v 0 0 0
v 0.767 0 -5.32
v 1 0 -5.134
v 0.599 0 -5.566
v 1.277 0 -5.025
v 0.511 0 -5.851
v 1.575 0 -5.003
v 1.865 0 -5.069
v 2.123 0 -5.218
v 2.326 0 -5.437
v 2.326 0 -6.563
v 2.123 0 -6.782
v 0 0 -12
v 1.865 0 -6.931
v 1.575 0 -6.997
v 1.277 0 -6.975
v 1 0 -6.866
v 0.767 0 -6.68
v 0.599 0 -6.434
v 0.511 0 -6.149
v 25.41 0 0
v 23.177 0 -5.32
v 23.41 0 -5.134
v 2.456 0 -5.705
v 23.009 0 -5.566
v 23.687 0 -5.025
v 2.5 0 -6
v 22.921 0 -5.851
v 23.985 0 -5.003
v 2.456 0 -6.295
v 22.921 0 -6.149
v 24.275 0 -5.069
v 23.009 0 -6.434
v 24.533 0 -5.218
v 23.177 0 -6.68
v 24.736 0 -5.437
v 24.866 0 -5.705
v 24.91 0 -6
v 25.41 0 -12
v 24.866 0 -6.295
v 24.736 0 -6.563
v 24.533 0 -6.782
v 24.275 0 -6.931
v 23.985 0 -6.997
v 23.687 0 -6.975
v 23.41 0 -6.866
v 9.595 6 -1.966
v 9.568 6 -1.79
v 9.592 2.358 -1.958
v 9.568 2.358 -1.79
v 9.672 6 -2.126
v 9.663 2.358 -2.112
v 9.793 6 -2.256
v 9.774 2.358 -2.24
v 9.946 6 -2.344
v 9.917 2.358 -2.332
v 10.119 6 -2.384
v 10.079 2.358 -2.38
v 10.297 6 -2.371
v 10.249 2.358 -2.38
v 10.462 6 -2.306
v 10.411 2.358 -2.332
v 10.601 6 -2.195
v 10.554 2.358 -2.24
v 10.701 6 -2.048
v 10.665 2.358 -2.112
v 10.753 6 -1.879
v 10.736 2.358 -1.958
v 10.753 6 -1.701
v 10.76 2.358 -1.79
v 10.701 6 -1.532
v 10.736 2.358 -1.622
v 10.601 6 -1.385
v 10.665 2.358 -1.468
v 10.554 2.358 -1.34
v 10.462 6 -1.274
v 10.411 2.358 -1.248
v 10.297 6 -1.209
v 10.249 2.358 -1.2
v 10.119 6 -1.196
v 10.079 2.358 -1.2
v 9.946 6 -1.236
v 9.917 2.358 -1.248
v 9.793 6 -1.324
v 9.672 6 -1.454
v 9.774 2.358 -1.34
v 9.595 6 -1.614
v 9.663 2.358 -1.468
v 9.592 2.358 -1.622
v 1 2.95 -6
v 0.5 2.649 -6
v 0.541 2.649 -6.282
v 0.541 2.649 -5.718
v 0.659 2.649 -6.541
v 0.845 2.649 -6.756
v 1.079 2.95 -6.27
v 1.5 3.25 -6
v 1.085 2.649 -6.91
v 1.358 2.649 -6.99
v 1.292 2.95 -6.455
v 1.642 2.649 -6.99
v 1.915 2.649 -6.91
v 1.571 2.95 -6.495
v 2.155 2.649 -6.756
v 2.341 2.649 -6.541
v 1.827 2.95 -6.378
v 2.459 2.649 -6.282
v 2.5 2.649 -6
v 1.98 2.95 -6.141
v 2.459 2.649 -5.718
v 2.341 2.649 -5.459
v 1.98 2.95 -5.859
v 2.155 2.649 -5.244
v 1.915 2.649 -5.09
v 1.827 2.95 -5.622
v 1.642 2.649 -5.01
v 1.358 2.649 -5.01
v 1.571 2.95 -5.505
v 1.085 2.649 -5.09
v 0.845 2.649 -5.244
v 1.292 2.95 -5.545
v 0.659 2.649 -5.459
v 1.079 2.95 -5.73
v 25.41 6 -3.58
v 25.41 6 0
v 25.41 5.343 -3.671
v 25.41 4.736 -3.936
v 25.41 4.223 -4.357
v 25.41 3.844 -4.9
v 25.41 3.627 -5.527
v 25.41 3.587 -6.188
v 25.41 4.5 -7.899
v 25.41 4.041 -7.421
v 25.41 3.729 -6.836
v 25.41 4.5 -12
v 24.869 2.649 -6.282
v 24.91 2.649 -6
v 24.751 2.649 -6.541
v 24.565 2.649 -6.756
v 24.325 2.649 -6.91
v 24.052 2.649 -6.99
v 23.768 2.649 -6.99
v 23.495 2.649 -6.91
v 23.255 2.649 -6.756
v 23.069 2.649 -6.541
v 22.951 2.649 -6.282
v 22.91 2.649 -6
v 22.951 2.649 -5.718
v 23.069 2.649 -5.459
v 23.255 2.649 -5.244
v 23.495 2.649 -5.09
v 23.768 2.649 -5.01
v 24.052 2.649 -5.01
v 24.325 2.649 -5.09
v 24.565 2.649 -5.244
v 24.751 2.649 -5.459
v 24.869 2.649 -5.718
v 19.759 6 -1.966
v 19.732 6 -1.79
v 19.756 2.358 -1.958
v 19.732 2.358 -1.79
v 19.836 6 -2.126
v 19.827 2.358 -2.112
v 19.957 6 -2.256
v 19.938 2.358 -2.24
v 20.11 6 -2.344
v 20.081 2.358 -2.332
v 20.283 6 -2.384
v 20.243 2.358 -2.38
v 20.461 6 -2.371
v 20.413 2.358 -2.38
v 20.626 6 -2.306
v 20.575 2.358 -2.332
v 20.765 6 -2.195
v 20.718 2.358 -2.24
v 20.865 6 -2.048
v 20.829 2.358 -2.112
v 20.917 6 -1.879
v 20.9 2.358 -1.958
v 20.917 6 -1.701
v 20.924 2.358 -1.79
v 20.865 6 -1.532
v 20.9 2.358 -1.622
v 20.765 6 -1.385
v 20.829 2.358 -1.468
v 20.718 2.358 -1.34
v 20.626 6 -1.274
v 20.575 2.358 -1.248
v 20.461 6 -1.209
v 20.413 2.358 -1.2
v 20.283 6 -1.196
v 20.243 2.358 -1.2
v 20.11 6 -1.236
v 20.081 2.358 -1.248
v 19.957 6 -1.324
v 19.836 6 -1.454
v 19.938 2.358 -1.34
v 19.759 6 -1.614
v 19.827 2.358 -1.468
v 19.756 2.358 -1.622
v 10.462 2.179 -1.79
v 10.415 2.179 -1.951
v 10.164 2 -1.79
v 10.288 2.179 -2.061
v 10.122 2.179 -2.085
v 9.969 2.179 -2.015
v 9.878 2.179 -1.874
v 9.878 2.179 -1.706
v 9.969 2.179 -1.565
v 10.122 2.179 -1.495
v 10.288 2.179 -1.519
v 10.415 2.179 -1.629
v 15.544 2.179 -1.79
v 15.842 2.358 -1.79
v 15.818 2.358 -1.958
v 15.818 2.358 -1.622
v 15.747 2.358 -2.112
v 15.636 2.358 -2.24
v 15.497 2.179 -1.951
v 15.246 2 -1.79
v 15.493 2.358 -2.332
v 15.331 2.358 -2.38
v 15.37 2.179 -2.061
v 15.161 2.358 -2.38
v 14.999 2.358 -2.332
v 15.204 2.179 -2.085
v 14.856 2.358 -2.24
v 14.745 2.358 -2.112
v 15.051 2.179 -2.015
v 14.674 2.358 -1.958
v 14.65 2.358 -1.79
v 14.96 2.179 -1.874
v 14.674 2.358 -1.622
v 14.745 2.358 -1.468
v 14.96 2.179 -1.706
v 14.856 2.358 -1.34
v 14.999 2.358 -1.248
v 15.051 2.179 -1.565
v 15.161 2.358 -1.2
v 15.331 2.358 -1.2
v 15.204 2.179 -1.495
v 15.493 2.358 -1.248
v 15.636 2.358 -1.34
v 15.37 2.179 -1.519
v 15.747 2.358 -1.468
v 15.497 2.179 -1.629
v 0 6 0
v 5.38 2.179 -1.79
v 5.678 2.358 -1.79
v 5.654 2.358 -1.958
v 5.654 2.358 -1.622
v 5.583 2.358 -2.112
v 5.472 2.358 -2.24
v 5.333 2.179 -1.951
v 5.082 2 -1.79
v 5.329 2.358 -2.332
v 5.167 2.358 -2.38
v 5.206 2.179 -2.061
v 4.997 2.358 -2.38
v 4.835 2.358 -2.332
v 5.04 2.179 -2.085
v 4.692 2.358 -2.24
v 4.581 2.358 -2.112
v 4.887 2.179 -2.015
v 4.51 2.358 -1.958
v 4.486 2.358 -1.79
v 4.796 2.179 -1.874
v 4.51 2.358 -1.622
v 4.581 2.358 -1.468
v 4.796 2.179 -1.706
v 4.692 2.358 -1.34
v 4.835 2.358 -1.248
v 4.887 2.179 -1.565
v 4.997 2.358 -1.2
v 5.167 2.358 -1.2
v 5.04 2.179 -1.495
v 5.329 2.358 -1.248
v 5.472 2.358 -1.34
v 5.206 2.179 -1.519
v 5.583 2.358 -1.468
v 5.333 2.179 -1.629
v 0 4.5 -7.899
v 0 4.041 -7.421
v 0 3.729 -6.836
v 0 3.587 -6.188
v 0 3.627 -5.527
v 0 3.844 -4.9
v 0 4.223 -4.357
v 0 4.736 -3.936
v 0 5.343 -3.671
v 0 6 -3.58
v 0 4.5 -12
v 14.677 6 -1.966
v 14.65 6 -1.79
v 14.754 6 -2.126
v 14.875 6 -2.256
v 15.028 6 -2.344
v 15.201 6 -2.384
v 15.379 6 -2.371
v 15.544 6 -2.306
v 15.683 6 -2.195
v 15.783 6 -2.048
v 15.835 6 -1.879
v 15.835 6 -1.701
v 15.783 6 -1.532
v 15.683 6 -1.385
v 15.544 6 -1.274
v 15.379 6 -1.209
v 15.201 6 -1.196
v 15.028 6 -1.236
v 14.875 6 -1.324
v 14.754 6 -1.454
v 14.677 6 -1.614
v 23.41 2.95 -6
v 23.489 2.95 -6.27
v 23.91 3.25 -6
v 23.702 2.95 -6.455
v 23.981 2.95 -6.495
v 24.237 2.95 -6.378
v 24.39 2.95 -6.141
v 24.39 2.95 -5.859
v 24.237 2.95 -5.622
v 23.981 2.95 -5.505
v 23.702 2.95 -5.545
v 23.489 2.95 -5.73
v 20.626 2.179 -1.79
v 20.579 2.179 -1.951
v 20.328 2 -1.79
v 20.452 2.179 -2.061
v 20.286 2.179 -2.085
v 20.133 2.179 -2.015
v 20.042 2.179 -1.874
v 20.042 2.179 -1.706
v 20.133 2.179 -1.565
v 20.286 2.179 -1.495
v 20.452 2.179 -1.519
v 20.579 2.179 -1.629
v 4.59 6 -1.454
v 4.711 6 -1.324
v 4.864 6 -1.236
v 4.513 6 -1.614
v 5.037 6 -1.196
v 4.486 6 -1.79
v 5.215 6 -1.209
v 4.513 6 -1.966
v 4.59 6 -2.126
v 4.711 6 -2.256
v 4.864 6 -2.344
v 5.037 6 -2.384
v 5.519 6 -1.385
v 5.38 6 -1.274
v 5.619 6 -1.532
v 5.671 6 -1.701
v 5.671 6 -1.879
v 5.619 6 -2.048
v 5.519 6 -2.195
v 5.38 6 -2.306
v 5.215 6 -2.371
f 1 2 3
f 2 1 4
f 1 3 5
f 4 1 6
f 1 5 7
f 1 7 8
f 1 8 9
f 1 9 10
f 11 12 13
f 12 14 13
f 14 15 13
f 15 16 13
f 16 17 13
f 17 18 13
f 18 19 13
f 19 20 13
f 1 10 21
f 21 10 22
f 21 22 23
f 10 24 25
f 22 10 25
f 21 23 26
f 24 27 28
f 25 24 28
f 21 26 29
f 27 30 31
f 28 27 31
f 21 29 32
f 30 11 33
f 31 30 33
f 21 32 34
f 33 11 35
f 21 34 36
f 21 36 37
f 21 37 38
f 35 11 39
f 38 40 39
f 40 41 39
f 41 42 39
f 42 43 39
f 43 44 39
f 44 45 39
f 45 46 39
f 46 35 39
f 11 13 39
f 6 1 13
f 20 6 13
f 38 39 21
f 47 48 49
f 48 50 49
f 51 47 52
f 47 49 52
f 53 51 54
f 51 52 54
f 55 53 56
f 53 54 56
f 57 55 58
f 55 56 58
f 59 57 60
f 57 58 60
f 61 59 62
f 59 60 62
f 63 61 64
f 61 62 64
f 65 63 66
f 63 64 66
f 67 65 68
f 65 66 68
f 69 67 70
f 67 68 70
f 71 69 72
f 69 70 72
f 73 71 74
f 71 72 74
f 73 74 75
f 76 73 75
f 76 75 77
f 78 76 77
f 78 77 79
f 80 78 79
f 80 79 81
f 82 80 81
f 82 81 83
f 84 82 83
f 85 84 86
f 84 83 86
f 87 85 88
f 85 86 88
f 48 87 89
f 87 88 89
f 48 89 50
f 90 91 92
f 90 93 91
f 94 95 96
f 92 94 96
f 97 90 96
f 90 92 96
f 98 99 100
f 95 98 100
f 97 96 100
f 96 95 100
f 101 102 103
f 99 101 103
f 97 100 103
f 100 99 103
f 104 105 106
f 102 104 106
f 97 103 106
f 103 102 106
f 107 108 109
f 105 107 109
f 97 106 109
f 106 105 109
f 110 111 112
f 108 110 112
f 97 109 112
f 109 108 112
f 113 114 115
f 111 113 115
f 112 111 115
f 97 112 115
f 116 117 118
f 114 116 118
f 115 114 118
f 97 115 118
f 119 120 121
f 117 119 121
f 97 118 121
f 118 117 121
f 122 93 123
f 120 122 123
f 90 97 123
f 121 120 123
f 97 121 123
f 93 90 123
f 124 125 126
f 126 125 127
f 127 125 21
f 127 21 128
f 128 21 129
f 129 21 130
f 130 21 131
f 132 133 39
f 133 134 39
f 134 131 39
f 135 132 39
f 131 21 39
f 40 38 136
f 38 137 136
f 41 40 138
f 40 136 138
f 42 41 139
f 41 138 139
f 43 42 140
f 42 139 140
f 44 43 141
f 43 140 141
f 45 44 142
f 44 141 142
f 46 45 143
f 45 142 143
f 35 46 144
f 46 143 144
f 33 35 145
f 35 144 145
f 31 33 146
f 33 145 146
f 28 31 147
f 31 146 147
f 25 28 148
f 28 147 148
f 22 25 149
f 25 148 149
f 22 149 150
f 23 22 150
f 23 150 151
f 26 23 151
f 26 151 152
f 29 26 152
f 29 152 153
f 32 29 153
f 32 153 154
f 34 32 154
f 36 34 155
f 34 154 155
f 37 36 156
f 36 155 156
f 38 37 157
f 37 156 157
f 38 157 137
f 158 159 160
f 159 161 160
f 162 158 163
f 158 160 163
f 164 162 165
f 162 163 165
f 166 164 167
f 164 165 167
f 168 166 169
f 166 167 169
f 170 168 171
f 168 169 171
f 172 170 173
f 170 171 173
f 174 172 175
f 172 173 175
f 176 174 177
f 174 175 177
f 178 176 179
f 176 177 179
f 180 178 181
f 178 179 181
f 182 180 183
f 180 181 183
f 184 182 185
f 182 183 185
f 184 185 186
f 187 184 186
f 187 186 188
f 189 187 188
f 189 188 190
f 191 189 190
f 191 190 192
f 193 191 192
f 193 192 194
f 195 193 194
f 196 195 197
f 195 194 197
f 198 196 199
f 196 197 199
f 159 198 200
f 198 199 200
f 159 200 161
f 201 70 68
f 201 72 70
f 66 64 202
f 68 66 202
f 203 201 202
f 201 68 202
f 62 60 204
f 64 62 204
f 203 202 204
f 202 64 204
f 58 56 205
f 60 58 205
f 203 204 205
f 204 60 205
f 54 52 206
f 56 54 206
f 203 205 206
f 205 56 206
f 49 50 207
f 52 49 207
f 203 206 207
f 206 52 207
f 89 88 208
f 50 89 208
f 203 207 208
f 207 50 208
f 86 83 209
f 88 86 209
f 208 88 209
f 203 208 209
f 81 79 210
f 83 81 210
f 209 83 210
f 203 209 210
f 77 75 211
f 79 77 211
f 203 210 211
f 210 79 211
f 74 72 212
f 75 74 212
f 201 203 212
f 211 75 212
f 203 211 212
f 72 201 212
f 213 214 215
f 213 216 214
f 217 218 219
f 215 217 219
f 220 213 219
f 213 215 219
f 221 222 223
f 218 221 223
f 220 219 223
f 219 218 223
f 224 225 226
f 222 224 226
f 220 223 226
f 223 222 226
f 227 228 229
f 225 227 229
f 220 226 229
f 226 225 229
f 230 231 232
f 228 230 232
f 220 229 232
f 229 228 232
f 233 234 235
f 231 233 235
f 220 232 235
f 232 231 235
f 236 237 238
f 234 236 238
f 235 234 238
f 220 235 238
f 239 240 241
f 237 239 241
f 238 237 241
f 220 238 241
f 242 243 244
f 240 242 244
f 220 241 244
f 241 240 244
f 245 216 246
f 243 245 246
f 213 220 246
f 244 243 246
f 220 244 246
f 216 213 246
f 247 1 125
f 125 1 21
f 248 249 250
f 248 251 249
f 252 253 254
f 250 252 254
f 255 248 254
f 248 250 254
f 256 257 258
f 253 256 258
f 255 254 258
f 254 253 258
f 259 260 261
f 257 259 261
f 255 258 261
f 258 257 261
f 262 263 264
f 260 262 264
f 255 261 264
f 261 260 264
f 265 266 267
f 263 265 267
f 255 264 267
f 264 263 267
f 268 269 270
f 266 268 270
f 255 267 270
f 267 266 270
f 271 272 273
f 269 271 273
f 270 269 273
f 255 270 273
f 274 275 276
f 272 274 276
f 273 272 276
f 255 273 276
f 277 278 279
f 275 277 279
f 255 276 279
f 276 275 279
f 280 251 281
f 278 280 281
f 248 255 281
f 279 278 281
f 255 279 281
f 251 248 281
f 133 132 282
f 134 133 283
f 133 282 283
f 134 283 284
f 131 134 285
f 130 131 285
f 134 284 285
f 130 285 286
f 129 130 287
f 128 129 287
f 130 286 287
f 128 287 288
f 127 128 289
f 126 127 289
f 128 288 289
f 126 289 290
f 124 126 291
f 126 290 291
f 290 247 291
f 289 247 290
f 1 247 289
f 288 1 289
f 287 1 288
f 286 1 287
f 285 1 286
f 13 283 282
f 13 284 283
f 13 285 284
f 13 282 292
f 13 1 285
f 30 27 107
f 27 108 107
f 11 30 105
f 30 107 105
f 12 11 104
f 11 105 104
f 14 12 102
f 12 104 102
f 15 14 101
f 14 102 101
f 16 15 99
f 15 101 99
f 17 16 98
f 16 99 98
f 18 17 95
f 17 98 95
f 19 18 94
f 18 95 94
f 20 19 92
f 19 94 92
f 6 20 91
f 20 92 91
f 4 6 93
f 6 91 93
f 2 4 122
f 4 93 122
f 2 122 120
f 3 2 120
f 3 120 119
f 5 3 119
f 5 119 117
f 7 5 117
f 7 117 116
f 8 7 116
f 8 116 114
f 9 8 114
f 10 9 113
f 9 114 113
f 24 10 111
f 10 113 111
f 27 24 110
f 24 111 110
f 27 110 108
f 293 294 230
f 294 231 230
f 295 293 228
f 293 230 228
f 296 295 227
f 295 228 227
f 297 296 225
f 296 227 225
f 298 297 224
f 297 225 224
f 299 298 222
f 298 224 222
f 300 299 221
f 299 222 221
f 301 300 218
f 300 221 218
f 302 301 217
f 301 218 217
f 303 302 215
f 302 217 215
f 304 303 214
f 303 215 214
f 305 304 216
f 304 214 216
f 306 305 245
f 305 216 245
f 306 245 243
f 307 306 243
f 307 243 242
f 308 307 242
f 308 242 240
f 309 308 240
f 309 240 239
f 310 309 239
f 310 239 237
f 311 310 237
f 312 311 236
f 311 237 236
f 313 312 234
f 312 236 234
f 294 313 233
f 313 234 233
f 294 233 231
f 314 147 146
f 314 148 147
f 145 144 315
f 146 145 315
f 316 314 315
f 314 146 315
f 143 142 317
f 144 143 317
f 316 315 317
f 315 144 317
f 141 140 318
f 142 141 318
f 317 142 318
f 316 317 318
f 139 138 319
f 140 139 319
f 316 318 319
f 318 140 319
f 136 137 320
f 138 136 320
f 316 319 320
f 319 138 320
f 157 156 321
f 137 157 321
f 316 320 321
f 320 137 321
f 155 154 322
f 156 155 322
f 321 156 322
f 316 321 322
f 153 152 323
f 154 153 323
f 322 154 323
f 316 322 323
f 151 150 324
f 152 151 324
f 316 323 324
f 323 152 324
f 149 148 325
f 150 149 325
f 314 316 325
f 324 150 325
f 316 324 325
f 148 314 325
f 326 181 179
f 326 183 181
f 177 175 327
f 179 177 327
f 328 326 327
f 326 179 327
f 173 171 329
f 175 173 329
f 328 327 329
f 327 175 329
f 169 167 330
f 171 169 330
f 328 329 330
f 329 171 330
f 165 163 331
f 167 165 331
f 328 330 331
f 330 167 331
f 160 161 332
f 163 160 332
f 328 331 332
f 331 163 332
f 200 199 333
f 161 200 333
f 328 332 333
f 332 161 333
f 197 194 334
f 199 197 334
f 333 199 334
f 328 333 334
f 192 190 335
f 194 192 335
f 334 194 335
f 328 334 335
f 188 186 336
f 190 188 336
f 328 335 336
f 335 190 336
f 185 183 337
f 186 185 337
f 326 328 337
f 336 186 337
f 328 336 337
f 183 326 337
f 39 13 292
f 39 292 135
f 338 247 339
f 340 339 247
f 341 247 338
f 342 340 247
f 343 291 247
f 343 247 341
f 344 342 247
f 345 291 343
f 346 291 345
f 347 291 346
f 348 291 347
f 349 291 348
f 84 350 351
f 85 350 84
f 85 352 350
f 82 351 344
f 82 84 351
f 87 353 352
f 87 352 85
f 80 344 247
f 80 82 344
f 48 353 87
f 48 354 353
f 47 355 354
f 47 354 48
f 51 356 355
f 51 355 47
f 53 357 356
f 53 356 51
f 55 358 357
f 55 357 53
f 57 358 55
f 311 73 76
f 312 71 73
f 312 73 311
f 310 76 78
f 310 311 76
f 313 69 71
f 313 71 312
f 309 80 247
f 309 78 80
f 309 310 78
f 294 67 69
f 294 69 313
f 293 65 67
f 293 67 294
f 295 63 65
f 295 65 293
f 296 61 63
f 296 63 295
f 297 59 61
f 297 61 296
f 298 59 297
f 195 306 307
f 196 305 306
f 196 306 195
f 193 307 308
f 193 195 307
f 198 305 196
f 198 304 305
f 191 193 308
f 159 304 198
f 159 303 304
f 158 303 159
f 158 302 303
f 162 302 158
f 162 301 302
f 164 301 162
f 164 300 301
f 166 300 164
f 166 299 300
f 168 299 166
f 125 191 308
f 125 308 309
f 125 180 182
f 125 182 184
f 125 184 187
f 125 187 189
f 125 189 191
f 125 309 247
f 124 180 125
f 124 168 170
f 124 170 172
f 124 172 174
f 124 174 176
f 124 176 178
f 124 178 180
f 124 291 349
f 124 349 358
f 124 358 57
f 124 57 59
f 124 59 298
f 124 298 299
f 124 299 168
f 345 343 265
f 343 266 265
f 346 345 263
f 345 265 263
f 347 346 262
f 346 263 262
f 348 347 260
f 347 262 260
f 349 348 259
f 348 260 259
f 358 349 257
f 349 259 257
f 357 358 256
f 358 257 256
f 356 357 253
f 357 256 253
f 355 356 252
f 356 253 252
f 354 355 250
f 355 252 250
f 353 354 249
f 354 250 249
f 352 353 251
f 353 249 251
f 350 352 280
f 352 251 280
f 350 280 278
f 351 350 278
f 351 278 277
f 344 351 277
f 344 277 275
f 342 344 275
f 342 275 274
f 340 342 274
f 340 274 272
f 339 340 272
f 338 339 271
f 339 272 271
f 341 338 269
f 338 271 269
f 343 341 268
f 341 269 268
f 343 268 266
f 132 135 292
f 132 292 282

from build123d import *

# Parameters (mm, degrees)
SKETCH1_W                 = 25.41
SKETCH1_H                 = 12
BOSS_EXTRUDE1_DEPTH       = 6
SKETCH2_R                 = 2.42
CUT_EXTRUDE1_DEPTH        = 25.41
SKETCH4_W                 = 4.522418919
SKETCH4_H                 = 1.5
CUT_EXTRUDE2_DEPTH        = 25.41
F_2_56_TAPPED_HOLE1_D     = 2.000000064
F_2_56_TAPPED_HOLE1_DEPTH = 2.649139362
F_2_56_TAPPED_HOLE1_TIP   = 0.600860638
F_0_80_TAPPED_HOLE1_D     = 1.19126
F_0_80_TAPPED_HOLE1_DEPTH = 3.642109389
F_0_80_TAPPED_HOLE1_TIP   = 0.357890611


with BuildPart() as part:
    # Sketch1 → Boss-Extrude1 (new body)
    with BuildSketch(Plane(origin=(0, 0, 0), x_dir=(1, 0, 0), z_dir=(0, 1, 0))):
        with Locations((12.705, 6)):
            Rectangle(SKETCH1_W, SKETCH1_H)
    extrude(amount=BOSS_EXTRUDE1_DEPTH)

    # Sketch2 → Cut-Extrude1 (cut)
    with BuildSketch(Plane.ZY):
        with Locations((-6, 6)):
            Circle(SKETCH2_R)
    extrude(amount=-CUT_EXTRUDE1_DEPTH, mode=Mode.SUBTRACT)

    # Sketch4 → Cut-Extrude2 (cut)
    with BuildSketch(Plane.ZY):
        with Locations((-9.738790541, 5.25)):
            Rectangle(SKETCH4_W, SKETCH4_H)
    extrude(amount=-CUT_EXTRUDE2_DEPTH, mode=Mode.SUBTRACT)

    # #2-56 Tapped Hole1
    with Locations(Plane(origin=(0, 0, 0), x_dir=(-1, 0, 0), z_dir=(0, -1, 0))):
        with Locations((-23.91, 6), (-1.5, 6)):
            Hole(F_2_56_TAPPED_HOLE1_D / 2, depth=F_2_56_TAPPED_HOLE1_DEPTH)
            with Locations((0, 0, -(F_2_56_TAPPED_HOLE1_DEPTH + F_2_56_TAPPED_HOLE1_TIP / 2))):  # 118° drill point
                Cone(0, F_2_56_TAPPED_HOLE1_D / 2, F_2_56_TAPPED_HOLE1_TIP, mode=Mode.SUBTRACT)

    # #0-80 Tapped Hole1
    with Locations(Plane(origin=(0, 6, 0), x_dir=(1, 0, 0), z_dir=(0, 1, 0))):
        with Locations((5.082, 1.79), (10.164, 1.79), (15.246, 1.79), (20.328, 1.79)):
            Hole(F_0_80_TAPPED_HOLE1_D / 2, depth=F_0_80_TAPPED_HOLE1_DEPTH)
            with Locations((0, 0, -(F_0_80_TAPPED_HOLE1_DEPTH + F_0_80_TAPPED_HOLE1_TIP / 2))):  # 118° drill point
                Cone(0, F_0_80_TAPPED_HOLE1_D / 2, F_0_80_TAPPED_HOLE1_TIP, mode=Mode.SUBTRACT)


solid = part.part
